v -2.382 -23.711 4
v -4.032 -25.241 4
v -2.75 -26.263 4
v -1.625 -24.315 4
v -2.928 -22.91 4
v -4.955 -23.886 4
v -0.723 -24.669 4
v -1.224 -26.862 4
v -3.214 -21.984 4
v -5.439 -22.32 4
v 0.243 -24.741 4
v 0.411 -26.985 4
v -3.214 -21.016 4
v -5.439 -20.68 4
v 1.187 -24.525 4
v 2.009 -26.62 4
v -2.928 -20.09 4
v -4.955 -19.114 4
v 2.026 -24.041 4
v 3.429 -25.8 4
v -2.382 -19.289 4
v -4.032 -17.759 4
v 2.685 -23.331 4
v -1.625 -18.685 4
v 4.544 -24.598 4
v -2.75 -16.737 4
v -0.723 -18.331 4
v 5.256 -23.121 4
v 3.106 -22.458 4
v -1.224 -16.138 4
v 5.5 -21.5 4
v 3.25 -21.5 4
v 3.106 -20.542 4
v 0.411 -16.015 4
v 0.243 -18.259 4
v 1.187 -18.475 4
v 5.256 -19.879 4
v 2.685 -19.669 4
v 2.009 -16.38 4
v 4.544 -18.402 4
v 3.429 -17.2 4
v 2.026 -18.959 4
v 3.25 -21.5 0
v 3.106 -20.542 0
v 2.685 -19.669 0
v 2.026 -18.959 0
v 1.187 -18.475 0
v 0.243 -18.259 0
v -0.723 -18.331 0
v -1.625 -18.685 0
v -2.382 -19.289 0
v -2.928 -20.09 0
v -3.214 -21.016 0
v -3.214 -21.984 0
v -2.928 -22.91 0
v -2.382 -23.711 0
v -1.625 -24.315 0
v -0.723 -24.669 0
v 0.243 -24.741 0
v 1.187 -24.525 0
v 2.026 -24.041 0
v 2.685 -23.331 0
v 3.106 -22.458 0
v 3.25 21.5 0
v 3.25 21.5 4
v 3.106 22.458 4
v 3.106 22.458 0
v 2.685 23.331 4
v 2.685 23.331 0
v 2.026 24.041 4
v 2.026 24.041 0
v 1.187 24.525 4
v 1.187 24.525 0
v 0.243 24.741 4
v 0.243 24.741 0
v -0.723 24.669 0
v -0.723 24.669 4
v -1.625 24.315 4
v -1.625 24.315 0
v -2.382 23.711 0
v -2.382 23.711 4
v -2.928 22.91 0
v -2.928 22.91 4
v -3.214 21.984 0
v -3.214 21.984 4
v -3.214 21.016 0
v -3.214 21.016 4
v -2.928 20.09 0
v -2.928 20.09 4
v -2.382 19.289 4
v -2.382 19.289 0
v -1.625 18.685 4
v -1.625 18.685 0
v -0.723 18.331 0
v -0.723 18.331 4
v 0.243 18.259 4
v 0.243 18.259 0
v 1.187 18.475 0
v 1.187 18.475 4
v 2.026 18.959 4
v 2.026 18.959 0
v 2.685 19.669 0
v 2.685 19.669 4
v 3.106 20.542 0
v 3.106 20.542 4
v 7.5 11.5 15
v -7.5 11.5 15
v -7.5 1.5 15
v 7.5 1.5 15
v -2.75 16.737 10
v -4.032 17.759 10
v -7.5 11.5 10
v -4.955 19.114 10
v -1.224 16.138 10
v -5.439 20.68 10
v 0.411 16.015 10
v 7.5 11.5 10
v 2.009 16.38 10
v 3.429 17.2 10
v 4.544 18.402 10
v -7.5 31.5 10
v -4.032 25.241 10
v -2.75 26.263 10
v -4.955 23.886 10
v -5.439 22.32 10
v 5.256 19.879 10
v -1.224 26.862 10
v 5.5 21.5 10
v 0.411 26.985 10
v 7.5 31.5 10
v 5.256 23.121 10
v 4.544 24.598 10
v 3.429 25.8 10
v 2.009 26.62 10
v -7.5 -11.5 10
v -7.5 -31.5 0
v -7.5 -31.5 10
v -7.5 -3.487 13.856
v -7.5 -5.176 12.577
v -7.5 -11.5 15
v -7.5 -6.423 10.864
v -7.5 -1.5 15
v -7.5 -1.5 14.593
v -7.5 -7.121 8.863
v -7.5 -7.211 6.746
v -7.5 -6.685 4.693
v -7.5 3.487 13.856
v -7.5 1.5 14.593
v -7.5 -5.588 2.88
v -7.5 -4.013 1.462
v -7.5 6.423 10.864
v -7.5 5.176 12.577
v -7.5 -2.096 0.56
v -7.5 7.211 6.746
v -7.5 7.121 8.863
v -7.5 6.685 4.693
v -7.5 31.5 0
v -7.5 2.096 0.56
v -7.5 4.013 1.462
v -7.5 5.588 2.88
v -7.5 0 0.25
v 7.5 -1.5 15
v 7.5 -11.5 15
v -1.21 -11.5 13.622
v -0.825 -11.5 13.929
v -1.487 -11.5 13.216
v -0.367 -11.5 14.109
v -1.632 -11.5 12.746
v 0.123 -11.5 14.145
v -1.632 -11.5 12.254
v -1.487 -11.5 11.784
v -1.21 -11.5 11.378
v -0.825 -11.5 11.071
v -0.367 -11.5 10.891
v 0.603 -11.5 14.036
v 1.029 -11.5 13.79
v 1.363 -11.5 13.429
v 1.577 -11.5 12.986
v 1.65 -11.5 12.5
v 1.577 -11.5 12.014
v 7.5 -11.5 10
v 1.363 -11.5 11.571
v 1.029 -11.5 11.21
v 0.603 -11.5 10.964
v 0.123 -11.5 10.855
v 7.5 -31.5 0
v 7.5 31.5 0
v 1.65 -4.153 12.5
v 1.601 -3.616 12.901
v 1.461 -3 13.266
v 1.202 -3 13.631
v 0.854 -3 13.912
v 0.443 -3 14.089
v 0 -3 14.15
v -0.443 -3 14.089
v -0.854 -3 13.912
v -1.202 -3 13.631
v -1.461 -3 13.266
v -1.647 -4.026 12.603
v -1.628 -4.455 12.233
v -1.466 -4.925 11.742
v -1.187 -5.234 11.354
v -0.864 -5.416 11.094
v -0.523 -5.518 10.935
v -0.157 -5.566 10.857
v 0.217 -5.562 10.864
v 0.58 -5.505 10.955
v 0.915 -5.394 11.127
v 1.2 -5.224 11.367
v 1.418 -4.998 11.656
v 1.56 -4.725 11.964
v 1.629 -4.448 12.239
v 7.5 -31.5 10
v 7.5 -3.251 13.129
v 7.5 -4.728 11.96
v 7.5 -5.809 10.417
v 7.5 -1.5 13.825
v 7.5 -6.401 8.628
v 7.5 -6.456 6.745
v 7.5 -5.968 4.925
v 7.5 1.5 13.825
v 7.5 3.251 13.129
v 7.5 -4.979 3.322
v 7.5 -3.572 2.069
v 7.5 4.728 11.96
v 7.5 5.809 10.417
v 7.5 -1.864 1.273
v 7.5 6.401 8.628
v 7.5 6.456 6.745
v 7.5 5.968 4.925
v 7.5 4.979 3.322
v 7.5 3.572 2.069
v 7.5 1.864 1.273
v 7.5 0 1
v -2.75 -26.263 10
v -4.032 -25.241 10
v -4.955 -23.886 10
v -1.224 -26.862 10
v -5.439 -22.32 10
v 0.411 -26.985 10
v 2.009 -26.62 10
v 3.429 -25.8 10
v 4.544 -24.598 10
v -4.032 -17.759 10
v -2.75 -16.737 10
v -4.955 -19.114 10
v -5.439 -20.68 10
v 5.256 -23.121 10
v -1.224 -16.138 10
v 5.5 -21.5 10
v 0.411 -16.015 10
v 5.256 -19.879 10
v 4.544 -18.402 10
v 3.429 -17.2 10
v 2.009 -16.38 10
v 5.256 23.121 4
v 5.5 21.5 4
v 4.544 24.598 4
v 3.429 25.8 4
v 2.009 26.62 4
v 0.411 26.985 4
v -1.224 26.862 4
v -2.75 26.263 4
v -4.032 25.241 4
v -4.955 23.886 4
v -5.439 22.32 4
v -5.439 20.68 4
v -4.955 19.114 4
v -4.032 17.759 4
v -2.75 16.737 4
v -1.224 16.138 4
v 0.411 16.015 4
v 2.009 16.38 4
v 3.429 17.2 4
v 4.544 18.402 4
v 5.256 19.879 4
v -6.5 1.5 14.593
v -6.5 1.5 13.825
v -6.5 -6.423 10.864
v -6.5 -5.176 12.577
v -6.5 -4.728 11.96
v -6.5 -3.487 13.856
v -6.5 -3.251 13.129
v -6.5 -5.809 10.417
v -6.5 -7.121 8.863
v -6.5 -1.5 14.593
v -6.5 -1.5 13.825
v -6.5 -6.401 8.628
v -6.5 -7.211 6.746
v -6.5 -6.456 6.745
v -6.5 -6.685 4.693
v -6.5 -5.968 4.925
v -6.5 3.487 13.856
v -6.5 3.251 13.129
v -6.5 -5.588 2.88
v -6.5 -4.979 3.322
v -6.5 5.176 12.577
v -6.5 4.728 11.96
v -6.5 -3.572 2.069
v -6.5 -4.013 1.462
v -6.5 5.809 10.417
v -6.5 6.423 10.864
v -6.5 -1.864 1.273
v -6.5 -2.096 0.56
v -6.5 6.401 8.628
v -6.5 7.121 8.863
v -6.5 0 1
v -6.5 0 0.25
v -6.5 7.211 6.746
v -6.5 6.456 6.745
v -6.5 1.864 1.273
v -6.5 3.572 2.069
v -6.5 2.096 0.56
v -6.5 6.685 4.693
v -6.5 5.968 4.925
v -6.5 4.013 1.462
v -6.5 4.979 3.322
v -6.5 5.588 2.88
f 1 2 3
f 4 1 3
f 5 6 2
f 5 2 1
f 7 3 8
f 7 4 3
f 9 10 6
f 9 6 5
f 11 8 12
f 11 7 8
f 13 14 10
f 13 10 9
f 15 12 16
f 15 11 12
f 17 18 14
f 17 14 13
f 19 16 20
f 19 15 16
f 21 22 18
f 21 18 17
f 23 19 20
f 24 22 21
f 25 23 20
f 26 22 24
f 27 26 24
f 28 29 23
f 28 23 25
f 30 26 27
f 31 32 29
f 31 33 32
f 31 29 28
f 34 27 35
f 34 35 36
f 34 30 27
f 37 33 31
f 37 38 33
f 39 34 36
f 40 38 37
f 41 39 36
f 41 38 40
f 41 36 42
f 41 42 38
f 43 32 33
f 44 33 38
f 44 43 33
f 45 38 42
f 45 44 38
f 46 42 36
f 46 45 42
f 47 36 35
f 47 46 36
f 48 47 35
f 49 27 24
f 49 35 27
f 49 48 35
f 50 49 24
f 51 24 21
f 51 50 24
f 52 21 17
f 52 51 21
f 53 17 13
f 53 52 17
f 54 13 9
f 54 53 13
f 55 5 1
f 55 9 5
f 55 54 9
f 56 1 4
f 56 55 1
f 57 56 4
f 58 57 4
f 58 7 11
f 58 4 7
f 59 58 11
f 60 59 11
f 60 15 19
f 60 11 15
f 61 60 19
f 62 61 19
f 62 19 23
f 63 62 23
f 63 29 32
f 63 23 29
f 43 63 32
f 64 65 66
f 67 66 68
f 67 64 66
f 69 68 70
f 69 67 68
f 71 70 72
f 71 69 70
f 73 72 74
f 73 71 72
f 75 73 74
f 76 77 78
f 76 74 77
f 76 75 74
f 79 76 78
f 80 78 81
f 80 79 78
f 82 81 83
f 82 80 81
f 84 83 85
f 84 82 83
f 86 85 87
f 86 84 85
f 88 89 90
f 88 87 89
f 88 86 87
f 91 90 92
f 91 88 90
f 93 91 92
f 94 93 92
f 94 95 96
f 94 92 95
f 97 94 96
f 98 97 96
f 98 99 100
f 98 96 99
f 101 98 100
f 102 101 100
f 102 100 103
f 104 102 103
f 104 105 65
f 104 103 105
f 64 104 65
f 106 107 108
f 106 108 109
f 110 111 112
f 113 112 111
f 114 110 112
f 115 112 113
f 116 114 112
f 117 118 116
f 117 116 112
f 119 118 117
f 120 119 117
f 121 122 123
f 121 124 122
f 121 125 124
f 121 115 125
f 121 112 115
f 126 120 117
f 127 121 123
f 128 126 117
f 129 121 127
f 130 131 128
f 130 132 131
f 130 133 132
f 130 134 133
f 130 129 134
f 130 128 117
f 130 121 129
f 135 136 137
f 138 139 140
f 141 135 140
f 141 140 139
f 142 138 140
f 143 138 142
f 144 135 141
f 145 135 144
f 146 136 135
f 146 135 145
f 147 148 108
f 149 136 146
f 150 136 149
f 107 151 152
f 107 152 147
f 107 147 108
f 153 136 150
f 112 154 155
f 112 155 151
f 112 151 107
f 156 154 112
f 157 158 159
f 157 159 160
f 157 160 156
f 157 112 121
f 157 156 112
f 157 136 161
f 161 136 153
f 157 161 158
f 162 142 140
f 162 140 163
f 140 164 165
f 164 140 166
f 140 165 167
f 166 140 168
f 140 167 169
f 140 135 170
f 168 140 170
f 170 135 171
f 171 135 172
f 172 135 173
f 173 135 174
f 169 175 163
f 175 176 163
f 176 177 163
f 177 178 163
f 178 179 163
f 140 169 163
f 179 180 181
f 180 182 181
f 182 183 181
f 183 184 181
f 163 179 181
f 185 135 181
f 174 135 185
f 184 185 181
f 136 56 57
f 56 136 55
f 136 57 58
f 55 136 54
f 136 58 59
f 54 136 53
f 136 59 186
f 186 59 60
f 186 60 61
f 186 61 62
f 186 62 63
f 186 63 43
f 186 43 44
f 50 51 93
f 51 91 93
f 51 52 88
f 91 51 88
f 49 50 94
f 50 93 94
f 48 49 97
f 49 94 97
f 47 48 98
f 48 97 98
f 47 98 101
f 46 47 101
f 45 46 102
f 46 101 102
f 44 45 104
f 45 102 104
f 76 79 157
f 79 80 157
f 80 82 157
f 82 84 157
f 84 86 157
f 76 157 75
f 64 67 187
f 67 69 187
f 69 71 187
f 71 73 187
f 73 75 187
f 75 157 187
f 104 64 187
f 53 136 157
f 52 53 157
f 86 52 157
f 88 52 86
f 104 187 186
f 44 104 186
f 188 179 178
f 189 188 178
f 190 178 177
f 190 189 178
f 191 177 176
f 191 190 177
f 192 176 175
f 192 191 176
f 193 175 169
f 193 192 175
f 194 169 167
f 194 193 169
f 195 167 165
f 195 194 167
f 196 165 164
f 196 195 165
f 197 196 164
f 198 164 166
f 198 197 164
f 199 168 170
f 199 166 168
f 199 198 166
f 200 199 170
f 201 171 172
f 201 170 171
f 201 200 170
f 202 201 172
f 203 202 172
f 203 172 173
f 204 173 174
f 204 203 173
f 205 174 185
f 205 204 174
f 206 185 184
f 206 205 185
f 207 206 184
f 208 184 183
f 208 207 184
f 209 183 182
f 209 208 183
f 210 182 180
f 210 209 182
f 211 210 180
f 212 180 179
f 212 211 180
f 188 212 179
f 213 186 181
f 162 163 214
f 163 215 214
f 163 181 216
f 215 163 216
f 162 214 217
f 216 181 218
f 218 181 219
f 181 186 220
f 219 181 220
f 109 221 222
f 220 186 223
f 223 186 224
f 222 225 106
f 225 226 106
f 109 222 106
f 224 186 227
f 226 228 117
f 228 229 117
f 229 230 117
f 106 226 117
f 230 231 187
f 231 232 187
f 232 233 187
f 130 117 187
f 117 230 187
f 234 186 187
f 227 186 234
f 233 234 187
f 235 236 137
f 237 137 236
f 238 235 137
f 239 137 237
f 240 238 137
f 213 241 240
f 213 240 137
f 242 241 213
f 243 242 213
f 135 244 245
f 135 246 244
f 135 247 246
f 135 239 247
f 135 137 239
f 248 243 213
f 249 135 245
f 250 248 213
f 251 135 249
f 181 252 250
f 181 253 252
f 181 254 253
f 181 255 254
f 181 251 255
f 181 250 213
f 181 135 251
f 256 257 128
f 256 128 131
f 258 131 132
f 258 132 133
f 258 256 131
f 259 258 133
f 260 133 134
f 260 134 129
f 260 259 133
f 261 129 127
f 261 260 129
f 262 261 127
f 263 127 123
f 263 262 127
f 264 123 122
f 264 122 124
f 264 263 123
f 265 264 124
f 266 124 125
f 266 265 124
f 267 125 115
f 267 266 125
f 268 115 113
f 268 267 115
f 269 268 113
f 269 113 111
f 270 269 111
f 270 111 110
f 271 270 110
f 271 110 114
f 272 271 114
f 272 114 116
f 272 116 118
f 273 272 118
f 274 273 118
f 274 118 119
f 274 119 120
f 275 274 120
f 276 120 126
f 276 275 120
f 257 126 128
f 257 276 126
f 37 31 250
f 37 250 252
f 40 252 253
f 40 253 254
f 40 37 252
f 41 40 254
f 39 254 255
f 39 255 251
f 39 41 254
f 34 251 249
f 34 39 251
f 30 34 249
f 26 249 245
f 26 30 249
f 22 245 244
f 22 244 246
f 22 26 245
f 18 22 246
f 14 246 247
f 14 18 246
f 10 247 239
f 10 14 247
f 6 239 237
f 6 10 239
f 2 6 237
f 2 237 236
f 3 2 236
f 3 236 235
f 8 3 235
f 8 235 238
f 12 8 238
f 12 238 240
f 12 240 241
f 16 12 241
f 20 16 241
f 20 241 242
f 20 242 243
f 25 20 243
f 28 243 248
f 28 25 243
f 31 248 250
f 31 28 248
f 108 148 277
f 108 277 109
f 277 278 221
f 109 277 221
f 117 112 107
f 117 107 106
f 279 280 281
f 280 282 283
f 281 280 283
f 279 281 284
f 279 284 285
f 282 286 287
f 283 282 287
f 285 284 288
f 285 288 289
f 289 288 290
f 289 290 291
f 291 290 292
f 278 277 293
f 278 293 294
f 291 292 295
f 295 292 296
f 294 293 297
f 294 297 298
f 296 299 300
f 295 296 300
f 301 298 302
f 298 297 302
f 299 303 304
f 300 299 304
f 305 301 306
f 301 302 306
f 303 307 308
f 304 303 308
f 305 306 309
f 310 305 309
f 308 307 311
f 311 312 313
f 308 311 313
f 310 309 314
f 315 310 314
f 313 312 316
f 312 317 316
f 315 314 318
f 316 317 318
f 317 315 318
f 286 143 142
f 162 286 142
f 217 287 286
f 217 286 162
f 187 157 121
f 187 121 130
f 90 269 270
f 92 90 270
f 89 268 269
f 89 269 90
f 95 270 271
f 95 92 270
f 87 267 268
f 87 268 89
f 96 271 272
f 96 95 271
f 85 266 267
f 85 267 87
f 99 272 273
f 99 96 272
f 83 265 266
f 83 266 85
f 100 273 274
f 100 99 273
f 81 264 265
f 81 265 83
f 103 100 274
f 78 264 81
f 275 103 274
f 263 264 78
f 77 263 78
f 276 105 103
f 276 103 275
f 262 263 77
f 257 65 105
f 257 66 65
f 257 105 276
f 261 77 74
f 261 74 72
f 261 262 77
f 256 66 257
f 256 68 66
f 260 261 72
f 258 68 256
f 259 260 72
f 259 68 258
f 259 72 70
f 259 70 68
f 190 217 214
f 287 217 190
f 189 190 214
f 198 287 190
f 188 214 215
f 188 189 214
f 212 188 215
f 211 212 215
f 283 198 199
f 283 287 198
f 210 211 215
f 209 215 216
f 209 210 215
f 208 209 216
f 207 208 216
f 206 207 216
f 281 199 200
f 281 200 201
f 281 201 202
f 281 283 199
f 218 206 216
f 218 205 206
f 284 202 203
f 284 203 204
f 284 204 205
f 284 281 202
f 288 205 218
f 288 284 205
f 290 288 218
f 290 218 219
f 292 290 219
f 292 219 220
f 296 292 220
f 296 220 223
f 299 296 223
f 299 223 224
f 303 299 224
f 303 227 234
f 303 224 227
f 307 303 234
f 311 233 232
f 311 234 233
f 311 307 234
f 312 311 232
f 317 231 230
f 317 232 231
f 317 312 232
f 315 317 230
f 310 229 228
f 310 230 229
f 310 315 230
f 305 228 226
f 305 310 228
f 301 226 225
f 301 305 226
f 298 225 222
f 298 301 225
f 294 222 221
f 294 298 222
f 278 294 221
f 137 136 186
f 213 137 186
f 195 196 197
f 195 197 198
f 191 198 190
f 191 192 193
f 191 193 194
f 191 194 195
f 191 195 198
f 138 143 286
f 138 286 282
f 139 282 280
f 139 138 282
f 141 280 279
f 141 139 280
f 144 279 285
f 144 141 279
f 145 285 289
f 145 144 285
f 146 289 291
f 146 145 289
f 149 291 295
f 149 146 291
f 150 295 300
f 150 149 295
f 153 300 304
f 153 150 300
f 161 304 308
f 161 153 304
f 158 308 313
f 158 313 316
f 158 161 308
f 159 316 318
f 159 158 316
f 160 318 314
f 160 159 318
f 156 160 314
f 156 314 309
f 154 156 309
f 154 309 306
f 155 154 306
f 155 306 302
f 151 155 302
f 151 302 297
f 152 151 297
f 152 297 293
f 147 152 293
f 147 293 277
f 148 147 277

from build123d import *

# Parameters (mm, degrees)
CYLINDER008_R             = 1.65
CYLINDER008_DEPTH         = 10
BOX_W                     = 15
BOX_H                     = 3
BOX_DEPTH                 = 10
CYLINDER014_R             = 7.25
CYLINDER014_DEPTH         = 1
CYLINDER013_R             = 6.5
CYLINDER013_DEPTH         = 32
FUSION010_PLACEMENT_ANGLE = 90
CYLINDER010_R             = 3.25
CYLINDER010_DEPTH         = 10
CYLINDER009_R             = 5.5
CYLINDER009_DEPTH         = 6
CYLINDER012_R             = 3.25
CYLINDER012_DEPTH         = 10
CYLINDER011_R             = 5.5
CYLINDER011_DEPTH         = 6
BOX006_W                  = 15
BOX006_H                  = 20
BOX006_DEPTH              = 20
BOX005_W                  = 15
BOX005_H                  = 20
BOX005_DEPTH              = 20
BOX004_W                  = 15
BOX004_H                  = 63
BOX004_DEPTH              = 15


with BuildPart() as m4wormscrew:
    # Cylinder008 → Cylinder008 (new body)
    with BuildSketch(Plane(origin=(0, -3, 12.5), x_dir=(1, 0, 0), z_dir=(0, -1, 0))):
        Circle(CYLINDER008_R)
    extrude(amount=CYLINDER008_DEPTH)


with BuildPart() as cube:
    # Box → Box (new body)
    with BuildSketch(Plane(origin=(-7.5, -1.5, 9), x_dir=(1, 0, 0), z_dir=(0, 0, 1))):
        with Locations((7.5, 1.5)):
            Rectangle(BOX_W, BOX_H)
    extrude(amount=BOX_DEPTH)


with BuildPart() as cylinder014:
    # Cylinder014 → Cylinder014 (new body)
    with BuildSketch(Plane.XY):
        Circle(CYLINDER014_R)
    extrude(amount=CYLINDER014_DEPTH)


with BuildPart() as lasermoduletemplate002:
    # Cylinder013 → Cylinder013 (new body)
    with BuildSketch(Plane.XY):
        Circle(CYLINDER013_R)
    extrude(amount=CYLINDER013_DEPTH)

    # Fusion010: union Cylinder014
    add(cylinder014.part)


with BuildPart() as lasermoduletemplate002_1:
    # Fusion010 placement: moved
    add(lasermoduletemplate002.part.moved(Location((-7.5, 0, 7.5))).rotate(Axis((-7.5, 0, 7.5), (0, 1, 0)), FUSION010_PLACEMENT_ANGLE))


with BuildPart() as cylinder010:
    # Cylinder010 → Cylinder010 (new body)
    with BuildSketch(Plane.XY):
        Circle(CYLINDER010_R)
    extrude(amount=CYLINDER010_DEPTH)


with BuildPart() as screwthrough003:
    # Cylinder009 → Cylinder009 (new body)
    with BuildSketch(Plane.XY.offset(4)):
        Circle(CYLINDER009_R)
    extrude(amount=CYLINDER009_DEPTH)

    # Fusion007: union Cylinder010
    add(cylinder010.part)


with BuildPart() as screwthrough003_1:
    # Fusion007 placement: moved
    add(screwthrough003.part.moved(Location((0, -21.5, 0))))


with BuildPart() as cylinder012:
    # Cylinder012 → Cylinder012 (new body)
    with BuildSketch(Plane.XY):
        Circle(CYLINDER012_R)
    extrude(amount=CYLINDER012_DEPTH)


with BuildPart() as fusion009:
    # Cylinder011 → Cylinder011 (new body)
    with BuildSketch(Plane.XY.offset(4)):
        Circle(CYLINDER011_R)
    extrude(amount=CYLINDER011_DEPTH)

    # Fusion008: union Cylinder012
    add(cylinder012.part)


with BuildPart() as fusion009_1:
    # Fusion008 placement: moved
    add(fusion009.part.moved(Location((0, 21.5, 0))))

    # Fusion009: union ScrewThrough003
    add(screwthrough003_1.part)


with BuildPart() as cube006:
    # Box006 → Box006 (new body)
    with BuildSketch(Plane(origin=(-15, -31.5, 10), x_dir=(1, 0, 0), z_dir=(0, 0, 1))):
        with Locations((7.5, 10)):
            Rectangle(BOX006_W, BOX006_H)
    extrude(amount=BOX006_DEPTH)


with BuildPart() as fusion006:
    # Box005 → Box005 (new body)
    with BuildSketch(Plane(origin=(-15, 11.5, 10), x_dir=(1, 0, 0), z_dir=(0, 0, 1))):
        with Locations((7.5, 10)):
            Rectangle(BOX005_W, BOX005_H)
    extrude(amount=BOX005_DEPTH)

    # Fusion006: union Cube006
    add(cube006.part)


with BuildPart() as cut008:
    # Box004 → Box004 (new body)
    with BuildSketch(Plane(origin=(-15, -31.5, 0), x_dir=(1, 0, 0), z_dir=(0, 0, 1))):
        with Locations((7.5, 31.5)):
            Rectangle(BOX004_W, BOX004_H)
    extrude(amount=BOX004_DEPTH)

    # Cut005: cut Fusion006
    add(fusion006.part, mode=Mode.SUBTRACT)


with BuildPart() as cut008_1:
    # Cut005 placement: moved
    add(cut008.part.moved(Location((7.5, 0, 0))))

    # Cut006: cut Fusion009
    add(fusion009_1.part, mode=Mode.SUBTRACT)

    # Cut007: cut LaserModuleTemplate002
    add(lasermoduletemplate002_1.part, mode=Mode.SUBTRACT)

    # Cut: cut Cube
    add(cube.part, mode=Mode.SUBTRACT)

    # Cut008: cut M4WormScrew
    add(m4wormscrew.part, mode=Mode.SUBTRACT)


solid = cut008_1.part
